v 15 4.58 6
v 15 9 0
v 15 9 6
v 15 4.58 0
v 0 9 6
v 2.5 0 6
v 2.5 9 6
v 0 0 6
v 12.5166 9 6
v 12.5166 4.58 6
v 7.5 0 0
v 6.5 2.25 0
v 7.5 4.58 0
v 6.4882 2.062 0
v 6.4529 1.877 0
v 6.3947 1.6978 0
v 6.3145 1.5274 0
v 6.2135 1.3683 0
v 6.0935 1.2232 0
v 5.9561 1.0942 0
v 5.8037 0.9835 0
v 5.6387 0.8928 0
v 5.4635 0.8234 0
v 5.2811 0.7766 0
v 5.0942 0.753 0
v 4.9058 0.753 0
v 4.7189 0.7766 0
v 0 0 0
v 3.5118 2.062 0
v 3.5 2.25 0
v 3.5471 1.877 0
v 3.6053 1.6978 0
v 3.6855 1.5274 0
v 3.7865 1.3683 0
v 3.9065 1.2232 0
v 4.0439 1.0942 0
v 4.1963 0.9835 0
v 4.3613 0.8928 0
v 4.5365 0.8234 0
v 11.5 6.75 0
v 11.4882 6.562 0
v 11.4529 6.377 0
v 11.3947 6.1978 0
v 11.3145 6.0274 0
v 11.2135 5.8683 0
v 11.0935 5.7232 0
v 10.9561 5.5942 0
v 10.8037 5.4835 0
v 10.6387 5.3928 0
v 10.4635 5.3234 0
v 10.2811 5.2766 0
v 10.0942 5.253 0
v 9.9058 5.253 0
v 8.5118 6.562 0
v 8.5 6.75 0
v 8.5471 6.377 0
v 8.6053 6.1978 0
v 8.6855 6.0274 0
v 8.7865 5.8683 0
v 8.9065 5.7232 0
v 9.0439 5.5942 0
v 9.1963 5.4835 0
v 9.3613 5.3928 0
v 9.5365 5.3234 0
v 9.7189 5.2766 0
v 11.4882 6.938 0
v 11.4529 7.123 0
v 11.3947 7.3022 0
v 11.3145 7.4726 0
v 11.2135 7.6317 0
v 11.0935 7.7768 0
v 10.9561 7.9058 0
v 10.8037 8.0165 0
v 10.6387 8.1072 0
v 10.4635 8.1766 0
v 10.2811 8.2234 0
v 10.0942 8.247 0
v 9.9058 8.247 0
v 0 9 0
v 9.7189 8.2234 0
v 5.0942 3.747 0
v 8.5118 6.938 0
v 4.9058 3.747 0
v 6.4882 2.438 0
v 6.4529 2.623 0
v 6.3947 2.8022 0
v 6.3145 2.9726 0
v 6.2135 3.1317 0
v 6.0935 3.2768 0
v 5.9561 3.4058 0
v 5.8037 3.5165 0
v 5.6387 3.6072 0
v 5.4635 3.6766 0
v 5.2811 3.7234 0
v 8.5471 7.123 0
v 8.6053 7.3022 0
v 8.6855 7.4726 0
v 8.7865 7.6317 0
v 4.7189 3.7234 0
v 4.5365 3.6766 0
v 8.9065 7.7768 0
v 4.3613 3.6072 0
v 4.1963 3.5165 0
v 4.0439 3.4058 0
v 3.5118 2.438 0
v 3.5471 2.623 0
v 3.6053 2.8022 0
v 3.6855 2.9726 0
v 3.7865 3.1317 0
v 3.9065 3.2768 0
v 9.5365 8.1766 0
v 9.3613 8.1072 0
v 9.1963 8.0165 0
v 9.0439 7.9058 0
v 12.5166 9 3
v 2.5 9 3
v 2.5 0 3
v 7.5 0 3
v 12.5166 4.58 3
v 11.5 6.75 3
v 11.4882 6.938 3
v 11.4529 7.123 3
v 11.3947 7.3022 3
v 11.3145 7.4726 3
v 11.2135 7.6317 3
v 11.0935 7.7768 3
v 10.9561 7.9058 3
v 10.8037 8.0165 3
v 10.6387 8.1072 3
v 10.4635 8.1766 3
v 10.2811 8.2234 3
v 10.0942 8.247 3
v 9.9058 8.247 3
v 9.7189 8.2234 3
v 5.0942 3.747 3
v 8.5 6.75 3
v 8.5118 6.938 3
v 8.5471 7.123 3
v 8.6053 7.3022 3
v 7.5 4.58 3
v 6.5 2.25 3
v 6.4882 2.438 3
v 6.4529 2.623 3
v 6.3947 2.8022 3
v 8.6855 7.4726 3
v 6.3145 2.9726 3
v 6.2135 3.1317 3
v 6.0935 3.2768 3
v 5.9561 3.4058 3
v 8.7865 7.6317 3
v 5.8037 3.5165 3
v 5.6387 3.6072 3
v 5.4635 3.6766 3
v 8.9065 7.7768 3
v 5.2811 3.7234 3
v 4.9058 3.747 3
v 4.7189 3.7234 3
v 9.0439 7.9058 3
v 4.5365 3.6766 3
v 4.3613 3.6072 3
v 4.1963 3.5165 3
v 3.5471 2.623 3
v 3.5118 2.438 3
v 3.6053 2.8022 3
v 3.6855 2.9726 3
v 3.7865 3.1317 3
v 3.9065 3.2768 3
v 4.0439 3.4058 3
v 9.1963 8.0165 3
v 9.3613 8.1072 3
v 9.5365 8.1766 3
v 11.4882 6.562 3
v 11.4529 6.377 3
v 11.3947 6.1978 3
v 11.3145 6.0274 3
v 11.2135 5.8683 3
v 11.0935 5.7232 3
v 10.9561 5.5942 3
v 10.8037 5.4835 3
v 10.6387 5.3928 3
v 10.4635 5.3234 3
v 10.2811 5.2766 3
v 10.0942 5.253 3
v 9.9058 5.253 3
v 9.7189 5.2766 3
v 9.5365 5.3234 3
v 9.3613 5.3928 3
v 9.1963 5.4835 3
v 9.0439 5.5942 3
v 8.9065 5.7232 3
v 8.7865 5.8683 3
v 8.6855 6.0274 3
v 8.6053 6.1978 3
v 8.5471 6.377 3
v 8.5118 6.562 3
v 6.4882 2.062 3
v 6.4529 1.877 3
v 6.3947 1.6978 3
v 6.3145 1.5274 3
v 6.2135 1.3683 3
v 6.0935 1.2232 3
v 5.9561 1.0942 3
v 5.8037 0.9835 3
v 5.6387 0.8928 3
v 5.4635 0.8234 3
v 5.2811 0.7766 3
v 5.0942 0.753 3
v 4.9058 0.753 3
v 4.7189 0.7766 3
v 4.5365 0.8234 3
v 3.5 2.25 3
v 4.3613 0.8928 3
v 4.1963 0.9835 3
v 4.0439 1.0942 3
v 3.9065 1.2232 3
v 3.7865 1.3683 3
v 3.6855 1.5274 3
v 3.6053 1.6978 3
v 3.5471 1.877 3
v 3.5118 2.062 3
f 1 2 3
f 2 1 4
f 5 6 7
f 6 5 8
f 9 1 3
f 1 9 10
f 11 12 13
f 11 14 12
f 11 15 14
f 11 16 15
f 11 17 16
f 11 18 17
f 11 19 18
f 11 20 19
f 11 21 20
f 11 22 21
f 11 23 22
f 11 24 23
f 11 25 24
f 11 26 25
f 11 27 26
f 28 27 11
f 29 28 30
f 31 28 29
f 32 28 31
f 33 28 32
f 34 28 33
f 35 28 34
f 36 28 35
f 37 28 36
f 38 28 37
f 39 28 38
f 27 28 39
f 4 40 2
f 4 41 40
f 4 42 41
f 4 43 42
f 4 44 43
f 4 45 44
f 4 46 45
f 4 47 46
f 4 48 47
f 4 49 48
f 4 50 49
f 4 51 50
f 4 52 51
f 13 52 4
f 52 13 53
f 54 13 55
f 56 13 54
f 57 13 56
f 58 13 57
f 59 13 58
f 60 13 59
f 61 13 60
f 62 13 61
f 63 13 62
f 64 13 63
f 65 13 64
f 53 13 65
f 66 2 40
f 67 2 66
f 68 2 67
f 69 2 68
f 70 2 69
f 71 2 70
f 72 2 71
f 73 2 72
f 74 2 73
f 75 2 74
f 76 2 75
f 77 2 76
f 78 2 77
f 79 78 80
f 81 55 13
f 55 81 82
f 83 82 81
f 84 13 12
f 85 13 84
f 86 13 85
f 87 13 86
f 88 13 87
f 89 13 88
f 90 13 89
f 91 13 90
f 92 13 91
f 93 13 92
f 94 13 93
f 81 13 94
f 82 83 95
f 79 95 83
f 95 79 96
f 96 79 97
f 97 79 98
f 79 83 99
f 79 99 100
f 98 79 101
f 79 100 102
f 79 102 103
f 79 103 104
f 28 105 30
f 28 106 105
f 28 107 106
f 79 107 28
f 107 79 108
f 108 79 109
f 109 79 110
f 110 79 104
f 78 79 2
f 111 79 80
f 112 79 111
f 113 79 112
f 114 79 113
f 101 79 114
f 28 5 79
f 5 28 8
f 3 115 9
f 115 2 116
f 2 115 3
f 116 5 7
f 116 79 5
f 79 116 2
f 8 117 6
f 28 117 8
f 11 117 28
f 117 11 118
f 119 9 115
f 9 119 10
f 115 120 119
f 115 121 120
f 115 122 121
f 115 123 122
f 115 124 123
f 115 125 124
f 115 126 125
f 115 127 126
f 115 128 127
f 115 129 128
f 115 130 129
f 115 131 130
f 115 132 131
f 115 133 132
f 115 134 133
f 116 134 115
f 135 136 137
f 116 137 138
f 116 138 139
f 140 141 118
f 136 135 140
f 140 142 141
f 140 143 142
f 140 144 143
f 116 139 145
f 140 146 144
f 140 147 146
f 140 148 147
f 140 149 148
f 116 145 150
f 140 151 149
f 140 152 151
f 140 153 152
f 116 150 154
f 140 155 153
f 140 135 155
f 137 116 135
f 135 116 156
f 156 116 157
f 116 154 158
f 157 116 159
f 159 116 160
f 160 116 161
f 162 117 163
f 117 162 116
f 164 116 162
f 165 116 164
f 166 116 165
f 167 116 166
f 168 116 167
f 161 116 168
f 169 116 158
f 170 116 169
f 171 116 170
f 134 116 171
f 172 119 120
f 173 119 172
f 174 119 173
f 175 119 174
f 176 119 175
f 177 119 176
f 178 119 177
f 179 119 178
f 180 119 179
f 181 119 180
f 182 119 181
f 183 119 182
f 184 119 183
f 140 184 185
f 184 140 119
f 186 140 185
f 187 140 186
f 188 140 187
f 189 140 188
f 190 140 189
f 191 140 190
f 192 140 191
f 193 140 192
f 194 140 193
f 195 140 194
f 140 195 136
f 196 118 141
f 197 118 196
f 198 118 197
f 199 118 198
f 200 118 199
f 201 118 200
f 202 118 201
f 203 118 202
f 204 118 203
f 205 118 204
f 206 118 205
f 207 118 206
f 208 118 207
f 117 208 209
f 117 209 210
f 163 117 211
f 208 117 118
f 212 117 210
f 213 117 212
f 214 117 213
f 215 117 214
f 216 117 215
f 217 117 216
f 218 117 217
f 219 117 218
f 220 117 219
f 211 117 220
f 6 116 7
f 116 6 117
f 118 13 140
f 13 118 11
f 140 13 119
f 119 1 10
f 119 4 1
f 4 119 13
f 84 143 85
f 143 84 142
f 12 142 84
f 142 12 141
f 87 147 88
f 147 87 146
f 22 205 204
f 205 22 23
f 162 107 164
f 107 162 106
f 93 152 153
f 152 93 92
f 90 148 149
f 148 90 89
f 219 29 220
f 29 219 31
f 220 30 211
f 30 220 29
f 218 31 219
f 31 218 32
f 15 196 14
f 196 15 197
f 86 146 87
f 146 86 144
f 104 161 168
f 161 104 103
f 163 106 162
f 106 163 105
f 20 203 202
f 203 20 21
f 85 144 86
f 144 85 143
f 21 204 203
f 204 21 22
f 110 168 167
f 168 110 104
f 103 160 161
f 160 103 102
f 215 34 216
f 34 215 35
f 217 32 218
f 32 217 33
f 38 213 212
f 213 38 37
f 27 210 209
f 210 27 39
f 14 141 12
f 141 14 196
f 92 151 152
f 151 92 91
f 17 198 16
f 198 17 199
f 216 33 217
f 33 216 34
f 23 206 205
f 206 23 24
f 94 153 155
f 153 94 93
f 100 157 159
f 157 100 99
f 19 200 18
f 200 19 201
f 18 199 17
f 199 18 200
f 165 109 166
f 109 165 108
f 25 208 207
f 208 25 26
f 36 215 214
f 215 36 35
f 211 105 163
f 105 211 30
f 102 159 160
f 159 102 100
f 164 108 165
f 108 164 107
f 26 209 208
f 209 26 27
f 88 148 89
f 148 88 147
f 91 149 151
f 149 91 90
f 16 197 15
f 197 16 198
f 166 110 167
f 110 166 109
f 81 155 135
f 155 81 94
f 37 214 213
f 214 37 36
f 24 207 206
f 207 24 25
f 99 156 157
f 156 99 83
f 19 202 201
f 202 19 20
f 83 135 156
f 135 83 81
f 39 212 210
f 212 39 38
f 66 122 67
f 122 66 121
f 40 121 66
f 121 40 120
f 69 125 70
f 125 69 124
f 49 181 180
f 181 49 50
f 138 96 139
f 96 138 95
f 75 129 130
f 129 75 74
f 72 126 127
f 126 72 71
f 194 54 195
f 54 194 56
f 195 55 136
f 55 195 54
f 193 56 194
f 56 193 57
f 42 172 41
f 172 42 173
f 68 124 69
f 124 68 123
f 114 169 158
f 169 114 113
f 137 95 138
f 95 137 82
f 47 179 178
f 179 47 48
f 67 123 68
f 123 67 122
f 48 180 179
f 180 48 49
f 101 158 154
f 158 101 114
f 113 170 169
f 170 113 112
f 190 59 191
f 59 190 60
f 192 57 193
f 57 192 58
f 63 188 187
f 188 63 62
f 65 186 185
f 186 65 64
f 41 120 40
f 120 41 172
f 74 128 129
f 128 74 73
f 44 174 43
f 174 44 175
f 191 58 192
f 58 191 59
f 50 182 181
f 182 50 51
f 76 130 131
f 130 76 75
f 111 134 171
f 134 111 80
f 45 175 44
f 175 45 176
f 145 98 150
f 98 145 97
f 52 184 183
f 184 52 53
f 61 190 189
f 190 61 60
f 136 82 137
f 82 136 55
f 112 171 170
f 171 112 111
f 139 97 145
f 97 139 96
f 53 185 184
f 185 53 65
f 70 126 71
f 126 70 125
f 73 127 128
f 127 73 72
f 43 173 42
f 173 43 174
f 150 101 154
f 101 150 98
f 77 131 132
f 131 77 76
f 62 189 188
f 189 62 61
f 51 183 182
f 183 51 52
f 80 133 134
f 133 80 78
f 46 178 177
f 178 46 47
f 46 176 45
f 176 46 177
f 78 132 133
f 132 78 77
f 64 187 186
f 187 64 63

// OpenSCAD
x=15;
y=9;
z=6;
$fn=50;
difference(){
    cube([x, y, z]);
    translate([x/6, -0.01, z/2])
        cube([x - x/3.01,y+0.01*y,z - z/2.01]);
    translate([x/2, -0.01, -0.01])
        cube([x/2 + 0.01*x, y/2 + 0.01*y, z+0.01*z]);
    translate([x/3,y/4,-0.01*z])
        cylinder(h=z/2 + 0.02*z,, d = y/3);
    translate([x*2/3,y*3/4,-0.01*z])
        cylinder(h=z/2 + 0.02*z,, d = y/3);
    
}
